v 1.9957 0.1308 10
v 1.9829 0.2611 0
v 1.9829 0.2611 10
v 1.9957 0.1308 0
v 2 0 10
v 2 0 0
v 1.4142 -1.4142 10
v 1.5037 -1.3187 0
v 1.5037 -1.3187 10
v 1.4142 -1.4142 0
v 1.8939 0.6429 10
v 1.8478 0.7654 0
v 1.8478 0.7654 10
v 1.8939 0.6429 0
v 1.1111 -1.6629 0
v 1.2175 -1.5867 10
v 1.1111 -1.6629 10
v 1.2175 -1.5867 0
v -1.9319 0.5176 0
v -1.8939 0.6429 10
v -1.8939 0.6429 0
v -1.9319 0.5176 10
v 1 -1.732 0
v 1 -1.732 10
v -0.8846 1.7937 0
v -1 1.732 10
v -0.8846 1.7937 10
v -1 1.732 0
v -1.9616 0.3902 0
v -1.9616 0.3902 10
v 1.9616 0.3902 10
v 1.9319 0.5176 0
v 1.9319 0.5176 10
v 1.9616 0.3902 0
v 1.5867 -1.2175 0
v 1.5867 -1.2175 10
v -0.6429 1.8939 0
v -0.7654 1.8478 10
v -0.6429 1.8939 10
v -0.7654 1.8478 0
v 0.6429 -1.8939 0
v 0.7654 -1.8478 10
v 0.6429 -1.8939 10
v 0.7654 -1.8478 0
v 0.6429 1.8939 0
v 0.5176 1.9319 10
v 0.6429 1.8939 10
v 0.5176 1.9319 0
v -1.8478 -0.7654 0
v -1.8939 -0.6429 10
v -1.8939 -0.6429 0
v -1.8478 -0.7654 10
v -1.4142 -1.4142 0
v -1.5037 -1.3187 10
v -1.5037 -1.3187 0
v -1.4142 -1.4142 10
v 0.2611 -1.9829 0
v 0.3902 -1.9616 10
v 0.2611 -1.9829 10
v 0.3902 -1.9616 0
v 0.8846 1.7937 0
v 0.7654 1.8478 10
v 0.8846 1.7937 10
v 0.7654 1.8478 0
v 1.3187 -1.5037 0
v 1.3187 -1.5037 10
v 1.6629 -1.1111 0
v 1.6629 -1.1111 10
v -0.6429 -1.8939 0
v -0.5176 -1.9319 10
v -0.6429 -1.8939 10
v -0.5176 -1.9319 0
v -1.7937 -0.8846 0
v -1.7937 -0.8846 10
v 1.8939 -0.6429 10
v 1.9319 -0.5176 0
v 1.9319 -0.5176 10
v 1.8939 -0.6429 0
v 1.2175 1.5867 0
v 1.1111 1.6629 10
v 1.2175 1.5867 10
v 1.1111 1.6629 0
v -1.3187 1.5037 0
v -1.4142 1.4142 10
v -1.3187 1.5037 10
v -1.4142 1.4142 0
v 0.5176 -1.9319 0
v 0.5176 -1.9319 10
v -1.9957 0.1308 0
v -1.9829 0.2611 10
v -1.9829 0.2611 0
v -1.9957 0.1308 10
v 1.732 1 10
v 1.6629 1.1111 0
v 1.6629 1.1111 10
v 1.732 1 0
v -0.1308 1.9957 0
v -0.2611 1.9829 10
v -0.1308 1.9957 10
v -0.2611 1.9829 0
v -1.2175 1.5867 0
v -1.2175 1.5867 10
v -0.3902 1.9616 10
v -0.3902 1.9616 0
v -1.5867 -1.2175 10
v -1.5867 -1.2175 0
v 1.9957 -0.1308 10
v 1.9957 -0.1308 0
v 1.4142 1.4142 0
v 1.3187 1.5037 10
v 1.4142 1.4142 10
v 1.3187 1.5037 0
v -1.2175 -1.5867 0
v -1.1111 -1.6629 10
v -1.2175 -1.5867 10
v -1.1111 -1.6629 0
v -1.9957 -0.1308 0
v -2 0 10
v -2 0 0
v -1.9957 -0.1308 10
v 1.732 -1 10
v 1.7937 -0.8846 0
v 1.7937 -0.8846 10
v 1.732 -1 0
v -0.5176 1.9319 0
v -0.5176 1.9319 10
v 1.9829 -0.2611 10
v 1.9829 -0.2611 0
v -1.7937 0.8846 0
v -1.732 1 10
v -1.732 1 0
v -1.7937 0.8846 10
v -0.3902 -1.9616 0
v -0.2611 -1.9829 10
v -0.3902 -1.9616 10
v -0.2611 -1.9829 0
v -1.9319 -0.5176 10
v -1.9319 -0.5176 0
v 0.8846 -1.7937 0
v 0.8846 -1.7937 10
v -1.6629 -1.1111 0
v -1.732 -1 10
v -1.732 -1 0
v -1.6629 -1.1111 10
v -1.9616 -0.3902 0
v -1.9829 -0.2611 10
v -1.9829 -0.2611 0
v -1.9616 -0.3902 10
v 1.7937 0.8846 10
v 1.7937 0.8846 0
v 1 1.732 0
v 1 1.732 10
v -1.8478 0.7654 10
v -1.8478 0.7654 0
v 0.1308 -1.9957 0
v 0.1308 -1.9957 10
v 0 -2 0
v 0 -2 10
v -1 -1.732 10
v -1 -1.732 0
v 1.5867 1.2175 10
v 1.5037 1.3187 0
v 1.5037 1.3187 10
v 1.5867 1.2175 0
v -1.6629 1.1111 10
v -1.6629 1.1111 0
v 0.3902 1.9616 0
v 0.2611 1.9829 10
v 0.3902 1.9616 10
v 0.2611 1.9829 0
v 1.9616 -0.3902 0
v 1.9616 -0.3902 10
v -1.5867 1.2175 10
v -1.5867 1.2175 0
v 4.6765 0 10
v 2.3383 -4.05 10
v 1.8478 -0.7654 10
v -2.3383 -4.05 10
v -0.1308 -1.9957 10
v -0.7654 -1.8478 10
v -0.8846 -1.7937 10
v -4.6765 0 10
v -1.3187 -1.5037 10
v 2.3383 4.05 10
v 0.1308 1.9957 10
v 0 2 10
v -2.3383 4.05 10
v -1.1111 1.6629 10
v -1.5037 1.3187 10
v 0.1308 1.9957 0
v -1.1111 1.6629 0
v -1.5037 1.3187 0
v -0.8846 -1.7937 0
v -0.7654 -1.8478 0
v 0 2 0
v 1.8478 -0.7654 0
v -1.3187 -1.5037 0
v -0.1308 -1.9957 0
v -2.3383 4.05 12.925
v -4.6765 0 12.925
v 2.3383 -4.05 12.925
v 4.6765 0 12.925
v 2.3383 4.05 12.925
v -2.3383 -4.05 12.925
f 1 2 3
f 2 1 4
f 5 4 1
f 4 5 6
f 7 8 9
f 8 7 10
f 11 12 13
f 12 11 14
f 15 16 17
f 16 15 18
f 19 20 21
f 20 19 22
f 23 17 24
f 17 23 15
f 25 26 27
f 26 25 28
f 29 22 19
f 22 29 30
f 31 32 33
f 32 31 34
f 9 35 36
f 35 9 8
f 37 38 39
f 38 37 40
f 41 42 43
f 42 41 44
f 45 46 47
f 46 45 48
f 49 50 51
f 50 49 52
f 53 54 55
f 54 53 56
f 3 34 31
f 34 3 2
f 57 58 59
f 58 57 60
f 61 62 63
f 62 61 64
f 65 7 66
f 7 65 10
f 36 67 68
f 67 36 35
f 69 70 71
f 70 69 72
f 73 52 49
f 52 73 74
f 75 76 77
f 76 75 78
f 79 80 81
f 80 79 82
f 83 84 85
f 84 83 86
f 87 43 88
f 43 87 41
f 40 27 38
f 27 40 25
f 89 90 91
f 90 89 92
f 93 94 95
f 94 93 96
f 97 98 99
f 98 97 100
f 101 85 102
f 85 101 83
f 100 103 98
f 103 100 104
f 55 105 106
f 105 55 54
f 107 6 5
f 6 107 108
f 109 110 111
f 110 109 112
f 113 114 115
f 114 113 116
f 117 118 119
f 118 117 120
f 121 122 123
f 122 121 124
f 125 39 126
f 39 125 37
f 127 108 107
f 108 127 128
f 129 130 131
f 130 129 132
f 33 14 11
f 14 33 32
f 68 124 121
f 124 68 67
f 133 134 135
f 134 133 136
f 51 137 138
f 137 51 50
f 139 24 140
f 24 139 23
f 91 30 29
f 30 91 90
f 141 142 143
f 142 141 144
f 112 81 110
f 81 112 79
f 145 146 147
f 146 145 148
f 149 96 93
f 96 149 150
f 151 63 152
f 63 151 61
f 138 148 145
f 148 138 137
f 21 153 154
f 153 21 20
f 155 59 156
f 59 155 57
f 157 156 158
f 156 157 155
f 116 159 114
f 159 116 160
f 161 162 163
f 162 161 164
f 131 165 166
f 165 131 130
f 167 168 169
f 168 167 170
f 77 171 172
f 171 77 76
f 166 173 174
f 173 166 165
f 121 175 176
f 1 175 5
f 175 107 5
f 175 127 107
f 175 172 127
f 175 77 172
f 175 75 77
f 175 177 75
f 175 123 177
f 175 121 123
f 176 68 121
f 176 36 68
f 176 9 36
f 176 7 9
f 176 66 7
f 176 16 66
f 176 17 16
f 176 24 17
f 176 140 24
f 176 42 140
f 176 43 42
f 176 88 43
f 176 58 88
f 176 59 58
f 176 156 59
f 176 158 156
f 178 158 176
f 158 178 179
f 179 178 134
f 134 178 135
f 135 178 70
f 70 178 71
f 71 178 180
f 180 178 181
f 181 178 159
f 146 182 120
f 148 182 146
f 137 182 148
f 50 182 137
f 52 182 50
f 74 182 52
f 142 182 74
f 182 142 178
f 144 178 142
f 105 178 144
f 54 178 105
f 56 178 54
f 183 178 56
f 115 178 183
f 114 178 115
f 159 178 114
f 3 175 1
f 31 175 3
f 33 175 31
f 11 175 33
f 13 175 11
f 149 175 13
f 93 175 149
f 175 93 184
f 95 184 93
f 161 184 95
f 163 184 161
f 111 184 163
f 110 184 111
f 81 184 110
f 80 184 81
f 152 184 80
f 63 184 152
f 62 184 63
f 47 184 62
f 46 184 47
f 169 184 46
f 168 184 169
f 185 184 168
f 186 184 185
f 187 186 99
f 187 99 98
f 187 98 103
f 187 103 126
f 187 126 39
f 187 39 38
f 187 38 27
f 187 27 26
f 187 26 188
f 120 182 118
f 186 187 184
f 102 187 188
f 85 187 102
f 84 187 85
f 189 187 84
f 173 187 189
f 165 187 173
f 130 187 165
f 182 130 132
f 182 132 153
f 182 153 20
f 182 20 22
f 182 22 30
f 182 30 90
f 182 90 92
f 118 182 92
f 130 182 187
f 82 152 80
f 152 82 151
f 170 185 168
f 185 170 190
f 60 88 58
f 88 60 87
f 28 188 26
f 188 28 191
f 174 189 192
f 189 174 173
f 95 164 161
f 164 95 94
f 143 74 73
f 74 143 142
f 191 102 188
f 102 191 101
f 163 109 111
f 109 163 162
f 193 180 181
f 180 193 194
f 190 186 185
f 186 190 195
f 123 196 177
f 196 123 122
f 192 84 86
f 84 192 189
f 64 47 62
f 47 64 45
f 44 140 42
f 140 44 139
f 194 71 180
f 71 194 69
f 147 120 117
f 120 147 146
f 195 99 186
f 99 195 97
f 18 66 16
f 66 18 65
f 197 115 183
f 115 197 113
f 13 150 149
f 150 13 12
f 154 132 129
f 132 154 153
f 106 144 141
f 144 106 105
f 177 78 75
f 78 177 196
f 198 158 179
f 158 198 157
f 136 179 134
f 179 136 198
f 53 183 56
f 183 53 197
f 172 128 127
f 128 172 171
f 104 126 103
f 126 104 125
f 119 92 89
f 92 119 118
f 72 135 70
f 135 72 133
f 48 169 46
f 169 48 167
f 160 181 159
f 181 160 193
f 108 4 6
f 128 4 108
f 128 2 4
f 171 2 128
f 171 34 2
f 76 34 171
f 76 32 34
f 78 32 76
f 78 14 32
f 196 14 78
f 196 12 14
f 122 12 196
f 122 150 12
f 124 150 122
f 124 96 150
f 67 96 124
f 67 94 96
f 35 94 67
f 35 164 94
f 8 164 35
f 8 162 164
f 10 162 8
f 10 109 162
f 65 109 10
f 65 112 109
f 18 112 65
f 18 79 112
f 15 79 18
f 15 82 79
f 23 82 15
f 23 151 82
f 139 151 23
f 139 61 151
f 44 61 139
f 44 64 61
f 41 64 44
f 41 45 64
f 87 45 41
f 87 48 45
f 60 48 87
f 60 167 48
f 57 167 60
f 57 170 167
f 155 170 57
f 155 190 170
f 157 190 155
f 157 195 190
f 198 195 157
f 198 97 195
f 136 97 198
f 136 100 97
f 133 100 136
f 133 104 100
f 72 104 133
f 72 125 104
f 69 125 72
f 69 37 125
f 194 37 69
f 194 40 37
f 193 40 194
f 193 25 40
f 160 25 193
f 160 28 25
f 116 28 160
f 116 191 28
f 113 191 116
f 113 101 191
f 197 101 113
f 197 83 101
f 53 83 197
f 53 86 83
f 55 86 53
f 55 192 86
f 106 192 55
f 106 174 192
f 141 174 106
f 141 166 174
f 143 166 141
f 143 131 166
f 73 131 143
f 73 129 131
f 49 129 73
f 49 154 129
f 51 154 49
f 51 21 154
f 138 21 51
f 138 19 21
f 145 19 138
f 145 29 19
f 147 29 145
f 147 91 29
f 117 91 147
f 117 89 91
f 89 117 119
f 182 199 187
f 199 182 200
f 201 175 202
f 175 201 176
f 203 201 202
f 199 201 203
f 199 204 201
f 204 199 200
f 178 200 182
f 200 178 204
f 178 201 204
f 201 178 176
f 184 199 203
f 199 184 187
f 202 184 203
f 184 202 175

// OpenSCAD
$fn = 96;

// Dimensions (mm)
shaft_d = 4.0;
length = 10.0;

head_flat_to_flat = 8.1;   // hex across flats
head_h = 2.925;

// Derived
shaft_r = shaft_d/2;
head_R = head_flat_to_flat / sqrt(3); // circumradius for hex with given across-flats

module hex_prism(h, R){
    linear_extrude(height=h)
        polygon(points=[for(i=[0:5]) [R*cos(60*i), R*sin(60*i)]]);
}

union() {
    // Shaft
    cylinder(h=length, r=shaft_r);

    // Hex head on top
    translate([0,0,length])
        hex_prism(head_h, head_R);
}
